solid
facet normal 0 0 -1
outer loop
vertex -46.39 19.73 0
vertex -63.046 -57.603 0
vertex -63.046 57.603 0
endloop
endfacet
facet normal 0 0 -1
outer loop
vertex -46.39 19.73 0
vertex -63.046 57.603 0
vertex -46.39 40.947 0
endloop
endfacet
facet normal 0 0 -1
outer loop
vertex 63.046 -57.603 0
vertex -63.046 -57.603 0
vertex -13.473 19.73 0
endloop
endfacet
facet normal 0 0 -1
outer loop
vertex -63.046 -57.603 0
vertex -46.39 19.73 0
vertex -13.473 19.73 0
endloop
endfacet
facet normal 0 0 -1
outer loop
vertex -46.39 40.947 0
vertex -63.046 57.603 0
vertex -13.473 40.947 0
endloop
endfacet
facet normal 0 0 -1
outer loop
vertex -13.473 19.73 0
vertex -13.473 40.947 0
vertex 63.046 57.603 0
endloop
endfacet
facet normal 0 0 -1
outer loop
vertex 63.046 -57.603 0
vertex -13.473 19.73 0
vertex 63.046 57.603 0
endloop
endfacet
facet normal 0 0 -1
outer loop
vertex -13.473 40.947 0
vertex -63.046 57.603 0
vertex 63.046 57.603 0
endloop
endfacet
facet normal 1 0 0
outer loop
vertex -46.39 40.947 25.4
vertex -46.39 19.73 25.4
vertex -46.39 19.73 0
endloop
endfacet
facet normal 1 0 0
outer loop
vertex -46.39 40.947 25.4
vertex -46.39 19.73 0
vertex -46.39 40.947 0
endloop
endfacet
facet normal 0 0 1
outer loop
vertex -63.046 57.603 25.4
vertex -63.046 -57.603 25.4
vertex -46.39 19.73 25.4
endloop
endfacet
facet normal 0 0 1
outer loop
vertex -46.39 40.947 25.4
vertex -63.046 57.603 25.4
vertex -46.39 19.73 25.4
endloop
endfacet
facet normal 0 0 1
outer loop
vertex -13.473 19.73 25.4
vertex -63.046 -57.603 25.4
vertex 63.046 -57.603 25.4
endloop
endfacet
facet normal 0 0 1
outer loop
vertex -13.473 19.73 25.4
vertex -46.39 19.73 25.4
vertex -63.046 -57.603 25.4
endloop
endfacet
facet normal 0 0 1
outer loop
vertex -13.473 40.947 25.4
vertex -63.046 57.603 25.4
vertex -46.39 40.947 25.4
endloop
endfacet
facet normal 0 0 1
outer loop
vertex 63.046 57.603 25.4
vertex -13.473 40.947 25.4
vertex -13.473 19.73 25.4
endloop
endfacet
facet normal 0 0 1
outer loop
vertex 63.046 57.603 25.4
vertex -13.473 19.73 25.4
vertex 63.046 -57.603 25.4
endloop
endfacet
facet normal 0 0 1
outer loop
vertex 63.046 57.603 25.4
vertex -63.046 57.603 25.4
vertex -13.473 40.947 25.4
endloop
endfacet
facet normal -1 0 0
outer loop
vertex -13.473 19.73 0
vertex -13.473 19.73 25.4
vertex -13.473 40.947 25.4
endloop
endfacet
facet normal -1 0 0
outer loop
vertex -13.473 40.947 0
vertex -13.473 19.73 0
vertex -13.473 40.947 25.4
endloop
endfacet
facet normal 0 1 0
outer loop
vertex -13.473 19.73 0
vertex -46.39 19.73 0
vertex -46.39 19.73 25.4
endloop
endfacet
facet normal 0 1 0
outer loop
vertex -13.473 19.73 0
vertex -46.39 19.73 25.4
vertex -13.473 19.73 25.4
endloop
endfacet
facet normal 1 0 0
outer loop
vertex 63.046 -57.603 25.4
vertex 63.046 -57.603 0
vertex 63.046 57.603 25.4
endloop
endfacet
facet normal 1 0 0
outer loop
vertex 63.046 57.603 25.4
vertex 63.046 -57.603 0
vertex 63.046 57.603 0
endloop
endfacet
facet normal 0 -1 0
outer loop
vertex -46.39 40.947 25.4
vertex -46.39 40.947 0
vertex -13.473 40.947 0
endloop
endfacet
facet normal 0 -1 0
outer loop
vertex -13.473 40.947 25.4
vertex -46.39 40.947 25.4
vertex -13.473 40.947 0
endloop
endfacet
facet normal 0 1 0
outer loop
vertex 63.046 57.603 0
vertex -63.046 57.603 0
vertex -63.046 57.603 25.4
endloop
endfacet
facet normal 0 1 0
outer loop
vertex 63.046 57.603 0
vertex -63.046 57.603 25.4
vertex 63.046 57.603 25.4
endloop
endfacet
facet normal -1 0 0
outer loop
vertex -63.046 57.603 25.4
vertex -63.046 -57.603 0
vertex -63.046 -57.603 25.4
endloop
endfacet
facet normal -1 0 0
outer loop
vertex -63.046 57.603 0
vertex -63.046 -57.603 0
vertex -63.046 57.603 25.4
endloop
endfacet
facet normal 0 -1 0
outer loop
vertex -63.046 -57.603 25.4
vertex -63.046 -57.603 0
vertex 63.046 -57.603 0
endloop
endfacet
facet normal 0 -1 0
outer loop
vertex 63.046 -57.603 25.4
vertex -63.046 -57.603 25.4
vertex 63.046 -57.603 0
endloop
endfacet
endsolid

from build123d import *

# Parameters (mm, degrees)
F1_W     = 73.41028
F1_H     = 38.70118
F2_DEPTH = 25.4
F0_W     = 126.091852
F0_H     = 115.206472
F3_DEPTH = 25.4
F4_W     = 32.916133
F4_H     = 21.217024
F5_DEPTH = 25.4


with BuildPart() as f2:
    # F1 (on Top) → F2 (new body)
    with BuildSketch(Plane.XY):
        Rectangle(F1_W, F1_H)
    extrude(amount=F2_DEPTH)

    # F0 (on Top) → F3 (join)
    with BuildSketch(Plane.XY):
        Rectangle(F0_W, F0_H)
    extrude(amount=F3_DEPTH)

    # F4 (on Top) → F5 (cut)
    with BuildSketch(Plane.XY):
        with Locations((-29.931498, 30.338363)):
            Rectangle(F4_W, F4_H)
    extrude(amount=F5_DEPTH, mode=Mode.SUBTRACT)


solid = f2.part
